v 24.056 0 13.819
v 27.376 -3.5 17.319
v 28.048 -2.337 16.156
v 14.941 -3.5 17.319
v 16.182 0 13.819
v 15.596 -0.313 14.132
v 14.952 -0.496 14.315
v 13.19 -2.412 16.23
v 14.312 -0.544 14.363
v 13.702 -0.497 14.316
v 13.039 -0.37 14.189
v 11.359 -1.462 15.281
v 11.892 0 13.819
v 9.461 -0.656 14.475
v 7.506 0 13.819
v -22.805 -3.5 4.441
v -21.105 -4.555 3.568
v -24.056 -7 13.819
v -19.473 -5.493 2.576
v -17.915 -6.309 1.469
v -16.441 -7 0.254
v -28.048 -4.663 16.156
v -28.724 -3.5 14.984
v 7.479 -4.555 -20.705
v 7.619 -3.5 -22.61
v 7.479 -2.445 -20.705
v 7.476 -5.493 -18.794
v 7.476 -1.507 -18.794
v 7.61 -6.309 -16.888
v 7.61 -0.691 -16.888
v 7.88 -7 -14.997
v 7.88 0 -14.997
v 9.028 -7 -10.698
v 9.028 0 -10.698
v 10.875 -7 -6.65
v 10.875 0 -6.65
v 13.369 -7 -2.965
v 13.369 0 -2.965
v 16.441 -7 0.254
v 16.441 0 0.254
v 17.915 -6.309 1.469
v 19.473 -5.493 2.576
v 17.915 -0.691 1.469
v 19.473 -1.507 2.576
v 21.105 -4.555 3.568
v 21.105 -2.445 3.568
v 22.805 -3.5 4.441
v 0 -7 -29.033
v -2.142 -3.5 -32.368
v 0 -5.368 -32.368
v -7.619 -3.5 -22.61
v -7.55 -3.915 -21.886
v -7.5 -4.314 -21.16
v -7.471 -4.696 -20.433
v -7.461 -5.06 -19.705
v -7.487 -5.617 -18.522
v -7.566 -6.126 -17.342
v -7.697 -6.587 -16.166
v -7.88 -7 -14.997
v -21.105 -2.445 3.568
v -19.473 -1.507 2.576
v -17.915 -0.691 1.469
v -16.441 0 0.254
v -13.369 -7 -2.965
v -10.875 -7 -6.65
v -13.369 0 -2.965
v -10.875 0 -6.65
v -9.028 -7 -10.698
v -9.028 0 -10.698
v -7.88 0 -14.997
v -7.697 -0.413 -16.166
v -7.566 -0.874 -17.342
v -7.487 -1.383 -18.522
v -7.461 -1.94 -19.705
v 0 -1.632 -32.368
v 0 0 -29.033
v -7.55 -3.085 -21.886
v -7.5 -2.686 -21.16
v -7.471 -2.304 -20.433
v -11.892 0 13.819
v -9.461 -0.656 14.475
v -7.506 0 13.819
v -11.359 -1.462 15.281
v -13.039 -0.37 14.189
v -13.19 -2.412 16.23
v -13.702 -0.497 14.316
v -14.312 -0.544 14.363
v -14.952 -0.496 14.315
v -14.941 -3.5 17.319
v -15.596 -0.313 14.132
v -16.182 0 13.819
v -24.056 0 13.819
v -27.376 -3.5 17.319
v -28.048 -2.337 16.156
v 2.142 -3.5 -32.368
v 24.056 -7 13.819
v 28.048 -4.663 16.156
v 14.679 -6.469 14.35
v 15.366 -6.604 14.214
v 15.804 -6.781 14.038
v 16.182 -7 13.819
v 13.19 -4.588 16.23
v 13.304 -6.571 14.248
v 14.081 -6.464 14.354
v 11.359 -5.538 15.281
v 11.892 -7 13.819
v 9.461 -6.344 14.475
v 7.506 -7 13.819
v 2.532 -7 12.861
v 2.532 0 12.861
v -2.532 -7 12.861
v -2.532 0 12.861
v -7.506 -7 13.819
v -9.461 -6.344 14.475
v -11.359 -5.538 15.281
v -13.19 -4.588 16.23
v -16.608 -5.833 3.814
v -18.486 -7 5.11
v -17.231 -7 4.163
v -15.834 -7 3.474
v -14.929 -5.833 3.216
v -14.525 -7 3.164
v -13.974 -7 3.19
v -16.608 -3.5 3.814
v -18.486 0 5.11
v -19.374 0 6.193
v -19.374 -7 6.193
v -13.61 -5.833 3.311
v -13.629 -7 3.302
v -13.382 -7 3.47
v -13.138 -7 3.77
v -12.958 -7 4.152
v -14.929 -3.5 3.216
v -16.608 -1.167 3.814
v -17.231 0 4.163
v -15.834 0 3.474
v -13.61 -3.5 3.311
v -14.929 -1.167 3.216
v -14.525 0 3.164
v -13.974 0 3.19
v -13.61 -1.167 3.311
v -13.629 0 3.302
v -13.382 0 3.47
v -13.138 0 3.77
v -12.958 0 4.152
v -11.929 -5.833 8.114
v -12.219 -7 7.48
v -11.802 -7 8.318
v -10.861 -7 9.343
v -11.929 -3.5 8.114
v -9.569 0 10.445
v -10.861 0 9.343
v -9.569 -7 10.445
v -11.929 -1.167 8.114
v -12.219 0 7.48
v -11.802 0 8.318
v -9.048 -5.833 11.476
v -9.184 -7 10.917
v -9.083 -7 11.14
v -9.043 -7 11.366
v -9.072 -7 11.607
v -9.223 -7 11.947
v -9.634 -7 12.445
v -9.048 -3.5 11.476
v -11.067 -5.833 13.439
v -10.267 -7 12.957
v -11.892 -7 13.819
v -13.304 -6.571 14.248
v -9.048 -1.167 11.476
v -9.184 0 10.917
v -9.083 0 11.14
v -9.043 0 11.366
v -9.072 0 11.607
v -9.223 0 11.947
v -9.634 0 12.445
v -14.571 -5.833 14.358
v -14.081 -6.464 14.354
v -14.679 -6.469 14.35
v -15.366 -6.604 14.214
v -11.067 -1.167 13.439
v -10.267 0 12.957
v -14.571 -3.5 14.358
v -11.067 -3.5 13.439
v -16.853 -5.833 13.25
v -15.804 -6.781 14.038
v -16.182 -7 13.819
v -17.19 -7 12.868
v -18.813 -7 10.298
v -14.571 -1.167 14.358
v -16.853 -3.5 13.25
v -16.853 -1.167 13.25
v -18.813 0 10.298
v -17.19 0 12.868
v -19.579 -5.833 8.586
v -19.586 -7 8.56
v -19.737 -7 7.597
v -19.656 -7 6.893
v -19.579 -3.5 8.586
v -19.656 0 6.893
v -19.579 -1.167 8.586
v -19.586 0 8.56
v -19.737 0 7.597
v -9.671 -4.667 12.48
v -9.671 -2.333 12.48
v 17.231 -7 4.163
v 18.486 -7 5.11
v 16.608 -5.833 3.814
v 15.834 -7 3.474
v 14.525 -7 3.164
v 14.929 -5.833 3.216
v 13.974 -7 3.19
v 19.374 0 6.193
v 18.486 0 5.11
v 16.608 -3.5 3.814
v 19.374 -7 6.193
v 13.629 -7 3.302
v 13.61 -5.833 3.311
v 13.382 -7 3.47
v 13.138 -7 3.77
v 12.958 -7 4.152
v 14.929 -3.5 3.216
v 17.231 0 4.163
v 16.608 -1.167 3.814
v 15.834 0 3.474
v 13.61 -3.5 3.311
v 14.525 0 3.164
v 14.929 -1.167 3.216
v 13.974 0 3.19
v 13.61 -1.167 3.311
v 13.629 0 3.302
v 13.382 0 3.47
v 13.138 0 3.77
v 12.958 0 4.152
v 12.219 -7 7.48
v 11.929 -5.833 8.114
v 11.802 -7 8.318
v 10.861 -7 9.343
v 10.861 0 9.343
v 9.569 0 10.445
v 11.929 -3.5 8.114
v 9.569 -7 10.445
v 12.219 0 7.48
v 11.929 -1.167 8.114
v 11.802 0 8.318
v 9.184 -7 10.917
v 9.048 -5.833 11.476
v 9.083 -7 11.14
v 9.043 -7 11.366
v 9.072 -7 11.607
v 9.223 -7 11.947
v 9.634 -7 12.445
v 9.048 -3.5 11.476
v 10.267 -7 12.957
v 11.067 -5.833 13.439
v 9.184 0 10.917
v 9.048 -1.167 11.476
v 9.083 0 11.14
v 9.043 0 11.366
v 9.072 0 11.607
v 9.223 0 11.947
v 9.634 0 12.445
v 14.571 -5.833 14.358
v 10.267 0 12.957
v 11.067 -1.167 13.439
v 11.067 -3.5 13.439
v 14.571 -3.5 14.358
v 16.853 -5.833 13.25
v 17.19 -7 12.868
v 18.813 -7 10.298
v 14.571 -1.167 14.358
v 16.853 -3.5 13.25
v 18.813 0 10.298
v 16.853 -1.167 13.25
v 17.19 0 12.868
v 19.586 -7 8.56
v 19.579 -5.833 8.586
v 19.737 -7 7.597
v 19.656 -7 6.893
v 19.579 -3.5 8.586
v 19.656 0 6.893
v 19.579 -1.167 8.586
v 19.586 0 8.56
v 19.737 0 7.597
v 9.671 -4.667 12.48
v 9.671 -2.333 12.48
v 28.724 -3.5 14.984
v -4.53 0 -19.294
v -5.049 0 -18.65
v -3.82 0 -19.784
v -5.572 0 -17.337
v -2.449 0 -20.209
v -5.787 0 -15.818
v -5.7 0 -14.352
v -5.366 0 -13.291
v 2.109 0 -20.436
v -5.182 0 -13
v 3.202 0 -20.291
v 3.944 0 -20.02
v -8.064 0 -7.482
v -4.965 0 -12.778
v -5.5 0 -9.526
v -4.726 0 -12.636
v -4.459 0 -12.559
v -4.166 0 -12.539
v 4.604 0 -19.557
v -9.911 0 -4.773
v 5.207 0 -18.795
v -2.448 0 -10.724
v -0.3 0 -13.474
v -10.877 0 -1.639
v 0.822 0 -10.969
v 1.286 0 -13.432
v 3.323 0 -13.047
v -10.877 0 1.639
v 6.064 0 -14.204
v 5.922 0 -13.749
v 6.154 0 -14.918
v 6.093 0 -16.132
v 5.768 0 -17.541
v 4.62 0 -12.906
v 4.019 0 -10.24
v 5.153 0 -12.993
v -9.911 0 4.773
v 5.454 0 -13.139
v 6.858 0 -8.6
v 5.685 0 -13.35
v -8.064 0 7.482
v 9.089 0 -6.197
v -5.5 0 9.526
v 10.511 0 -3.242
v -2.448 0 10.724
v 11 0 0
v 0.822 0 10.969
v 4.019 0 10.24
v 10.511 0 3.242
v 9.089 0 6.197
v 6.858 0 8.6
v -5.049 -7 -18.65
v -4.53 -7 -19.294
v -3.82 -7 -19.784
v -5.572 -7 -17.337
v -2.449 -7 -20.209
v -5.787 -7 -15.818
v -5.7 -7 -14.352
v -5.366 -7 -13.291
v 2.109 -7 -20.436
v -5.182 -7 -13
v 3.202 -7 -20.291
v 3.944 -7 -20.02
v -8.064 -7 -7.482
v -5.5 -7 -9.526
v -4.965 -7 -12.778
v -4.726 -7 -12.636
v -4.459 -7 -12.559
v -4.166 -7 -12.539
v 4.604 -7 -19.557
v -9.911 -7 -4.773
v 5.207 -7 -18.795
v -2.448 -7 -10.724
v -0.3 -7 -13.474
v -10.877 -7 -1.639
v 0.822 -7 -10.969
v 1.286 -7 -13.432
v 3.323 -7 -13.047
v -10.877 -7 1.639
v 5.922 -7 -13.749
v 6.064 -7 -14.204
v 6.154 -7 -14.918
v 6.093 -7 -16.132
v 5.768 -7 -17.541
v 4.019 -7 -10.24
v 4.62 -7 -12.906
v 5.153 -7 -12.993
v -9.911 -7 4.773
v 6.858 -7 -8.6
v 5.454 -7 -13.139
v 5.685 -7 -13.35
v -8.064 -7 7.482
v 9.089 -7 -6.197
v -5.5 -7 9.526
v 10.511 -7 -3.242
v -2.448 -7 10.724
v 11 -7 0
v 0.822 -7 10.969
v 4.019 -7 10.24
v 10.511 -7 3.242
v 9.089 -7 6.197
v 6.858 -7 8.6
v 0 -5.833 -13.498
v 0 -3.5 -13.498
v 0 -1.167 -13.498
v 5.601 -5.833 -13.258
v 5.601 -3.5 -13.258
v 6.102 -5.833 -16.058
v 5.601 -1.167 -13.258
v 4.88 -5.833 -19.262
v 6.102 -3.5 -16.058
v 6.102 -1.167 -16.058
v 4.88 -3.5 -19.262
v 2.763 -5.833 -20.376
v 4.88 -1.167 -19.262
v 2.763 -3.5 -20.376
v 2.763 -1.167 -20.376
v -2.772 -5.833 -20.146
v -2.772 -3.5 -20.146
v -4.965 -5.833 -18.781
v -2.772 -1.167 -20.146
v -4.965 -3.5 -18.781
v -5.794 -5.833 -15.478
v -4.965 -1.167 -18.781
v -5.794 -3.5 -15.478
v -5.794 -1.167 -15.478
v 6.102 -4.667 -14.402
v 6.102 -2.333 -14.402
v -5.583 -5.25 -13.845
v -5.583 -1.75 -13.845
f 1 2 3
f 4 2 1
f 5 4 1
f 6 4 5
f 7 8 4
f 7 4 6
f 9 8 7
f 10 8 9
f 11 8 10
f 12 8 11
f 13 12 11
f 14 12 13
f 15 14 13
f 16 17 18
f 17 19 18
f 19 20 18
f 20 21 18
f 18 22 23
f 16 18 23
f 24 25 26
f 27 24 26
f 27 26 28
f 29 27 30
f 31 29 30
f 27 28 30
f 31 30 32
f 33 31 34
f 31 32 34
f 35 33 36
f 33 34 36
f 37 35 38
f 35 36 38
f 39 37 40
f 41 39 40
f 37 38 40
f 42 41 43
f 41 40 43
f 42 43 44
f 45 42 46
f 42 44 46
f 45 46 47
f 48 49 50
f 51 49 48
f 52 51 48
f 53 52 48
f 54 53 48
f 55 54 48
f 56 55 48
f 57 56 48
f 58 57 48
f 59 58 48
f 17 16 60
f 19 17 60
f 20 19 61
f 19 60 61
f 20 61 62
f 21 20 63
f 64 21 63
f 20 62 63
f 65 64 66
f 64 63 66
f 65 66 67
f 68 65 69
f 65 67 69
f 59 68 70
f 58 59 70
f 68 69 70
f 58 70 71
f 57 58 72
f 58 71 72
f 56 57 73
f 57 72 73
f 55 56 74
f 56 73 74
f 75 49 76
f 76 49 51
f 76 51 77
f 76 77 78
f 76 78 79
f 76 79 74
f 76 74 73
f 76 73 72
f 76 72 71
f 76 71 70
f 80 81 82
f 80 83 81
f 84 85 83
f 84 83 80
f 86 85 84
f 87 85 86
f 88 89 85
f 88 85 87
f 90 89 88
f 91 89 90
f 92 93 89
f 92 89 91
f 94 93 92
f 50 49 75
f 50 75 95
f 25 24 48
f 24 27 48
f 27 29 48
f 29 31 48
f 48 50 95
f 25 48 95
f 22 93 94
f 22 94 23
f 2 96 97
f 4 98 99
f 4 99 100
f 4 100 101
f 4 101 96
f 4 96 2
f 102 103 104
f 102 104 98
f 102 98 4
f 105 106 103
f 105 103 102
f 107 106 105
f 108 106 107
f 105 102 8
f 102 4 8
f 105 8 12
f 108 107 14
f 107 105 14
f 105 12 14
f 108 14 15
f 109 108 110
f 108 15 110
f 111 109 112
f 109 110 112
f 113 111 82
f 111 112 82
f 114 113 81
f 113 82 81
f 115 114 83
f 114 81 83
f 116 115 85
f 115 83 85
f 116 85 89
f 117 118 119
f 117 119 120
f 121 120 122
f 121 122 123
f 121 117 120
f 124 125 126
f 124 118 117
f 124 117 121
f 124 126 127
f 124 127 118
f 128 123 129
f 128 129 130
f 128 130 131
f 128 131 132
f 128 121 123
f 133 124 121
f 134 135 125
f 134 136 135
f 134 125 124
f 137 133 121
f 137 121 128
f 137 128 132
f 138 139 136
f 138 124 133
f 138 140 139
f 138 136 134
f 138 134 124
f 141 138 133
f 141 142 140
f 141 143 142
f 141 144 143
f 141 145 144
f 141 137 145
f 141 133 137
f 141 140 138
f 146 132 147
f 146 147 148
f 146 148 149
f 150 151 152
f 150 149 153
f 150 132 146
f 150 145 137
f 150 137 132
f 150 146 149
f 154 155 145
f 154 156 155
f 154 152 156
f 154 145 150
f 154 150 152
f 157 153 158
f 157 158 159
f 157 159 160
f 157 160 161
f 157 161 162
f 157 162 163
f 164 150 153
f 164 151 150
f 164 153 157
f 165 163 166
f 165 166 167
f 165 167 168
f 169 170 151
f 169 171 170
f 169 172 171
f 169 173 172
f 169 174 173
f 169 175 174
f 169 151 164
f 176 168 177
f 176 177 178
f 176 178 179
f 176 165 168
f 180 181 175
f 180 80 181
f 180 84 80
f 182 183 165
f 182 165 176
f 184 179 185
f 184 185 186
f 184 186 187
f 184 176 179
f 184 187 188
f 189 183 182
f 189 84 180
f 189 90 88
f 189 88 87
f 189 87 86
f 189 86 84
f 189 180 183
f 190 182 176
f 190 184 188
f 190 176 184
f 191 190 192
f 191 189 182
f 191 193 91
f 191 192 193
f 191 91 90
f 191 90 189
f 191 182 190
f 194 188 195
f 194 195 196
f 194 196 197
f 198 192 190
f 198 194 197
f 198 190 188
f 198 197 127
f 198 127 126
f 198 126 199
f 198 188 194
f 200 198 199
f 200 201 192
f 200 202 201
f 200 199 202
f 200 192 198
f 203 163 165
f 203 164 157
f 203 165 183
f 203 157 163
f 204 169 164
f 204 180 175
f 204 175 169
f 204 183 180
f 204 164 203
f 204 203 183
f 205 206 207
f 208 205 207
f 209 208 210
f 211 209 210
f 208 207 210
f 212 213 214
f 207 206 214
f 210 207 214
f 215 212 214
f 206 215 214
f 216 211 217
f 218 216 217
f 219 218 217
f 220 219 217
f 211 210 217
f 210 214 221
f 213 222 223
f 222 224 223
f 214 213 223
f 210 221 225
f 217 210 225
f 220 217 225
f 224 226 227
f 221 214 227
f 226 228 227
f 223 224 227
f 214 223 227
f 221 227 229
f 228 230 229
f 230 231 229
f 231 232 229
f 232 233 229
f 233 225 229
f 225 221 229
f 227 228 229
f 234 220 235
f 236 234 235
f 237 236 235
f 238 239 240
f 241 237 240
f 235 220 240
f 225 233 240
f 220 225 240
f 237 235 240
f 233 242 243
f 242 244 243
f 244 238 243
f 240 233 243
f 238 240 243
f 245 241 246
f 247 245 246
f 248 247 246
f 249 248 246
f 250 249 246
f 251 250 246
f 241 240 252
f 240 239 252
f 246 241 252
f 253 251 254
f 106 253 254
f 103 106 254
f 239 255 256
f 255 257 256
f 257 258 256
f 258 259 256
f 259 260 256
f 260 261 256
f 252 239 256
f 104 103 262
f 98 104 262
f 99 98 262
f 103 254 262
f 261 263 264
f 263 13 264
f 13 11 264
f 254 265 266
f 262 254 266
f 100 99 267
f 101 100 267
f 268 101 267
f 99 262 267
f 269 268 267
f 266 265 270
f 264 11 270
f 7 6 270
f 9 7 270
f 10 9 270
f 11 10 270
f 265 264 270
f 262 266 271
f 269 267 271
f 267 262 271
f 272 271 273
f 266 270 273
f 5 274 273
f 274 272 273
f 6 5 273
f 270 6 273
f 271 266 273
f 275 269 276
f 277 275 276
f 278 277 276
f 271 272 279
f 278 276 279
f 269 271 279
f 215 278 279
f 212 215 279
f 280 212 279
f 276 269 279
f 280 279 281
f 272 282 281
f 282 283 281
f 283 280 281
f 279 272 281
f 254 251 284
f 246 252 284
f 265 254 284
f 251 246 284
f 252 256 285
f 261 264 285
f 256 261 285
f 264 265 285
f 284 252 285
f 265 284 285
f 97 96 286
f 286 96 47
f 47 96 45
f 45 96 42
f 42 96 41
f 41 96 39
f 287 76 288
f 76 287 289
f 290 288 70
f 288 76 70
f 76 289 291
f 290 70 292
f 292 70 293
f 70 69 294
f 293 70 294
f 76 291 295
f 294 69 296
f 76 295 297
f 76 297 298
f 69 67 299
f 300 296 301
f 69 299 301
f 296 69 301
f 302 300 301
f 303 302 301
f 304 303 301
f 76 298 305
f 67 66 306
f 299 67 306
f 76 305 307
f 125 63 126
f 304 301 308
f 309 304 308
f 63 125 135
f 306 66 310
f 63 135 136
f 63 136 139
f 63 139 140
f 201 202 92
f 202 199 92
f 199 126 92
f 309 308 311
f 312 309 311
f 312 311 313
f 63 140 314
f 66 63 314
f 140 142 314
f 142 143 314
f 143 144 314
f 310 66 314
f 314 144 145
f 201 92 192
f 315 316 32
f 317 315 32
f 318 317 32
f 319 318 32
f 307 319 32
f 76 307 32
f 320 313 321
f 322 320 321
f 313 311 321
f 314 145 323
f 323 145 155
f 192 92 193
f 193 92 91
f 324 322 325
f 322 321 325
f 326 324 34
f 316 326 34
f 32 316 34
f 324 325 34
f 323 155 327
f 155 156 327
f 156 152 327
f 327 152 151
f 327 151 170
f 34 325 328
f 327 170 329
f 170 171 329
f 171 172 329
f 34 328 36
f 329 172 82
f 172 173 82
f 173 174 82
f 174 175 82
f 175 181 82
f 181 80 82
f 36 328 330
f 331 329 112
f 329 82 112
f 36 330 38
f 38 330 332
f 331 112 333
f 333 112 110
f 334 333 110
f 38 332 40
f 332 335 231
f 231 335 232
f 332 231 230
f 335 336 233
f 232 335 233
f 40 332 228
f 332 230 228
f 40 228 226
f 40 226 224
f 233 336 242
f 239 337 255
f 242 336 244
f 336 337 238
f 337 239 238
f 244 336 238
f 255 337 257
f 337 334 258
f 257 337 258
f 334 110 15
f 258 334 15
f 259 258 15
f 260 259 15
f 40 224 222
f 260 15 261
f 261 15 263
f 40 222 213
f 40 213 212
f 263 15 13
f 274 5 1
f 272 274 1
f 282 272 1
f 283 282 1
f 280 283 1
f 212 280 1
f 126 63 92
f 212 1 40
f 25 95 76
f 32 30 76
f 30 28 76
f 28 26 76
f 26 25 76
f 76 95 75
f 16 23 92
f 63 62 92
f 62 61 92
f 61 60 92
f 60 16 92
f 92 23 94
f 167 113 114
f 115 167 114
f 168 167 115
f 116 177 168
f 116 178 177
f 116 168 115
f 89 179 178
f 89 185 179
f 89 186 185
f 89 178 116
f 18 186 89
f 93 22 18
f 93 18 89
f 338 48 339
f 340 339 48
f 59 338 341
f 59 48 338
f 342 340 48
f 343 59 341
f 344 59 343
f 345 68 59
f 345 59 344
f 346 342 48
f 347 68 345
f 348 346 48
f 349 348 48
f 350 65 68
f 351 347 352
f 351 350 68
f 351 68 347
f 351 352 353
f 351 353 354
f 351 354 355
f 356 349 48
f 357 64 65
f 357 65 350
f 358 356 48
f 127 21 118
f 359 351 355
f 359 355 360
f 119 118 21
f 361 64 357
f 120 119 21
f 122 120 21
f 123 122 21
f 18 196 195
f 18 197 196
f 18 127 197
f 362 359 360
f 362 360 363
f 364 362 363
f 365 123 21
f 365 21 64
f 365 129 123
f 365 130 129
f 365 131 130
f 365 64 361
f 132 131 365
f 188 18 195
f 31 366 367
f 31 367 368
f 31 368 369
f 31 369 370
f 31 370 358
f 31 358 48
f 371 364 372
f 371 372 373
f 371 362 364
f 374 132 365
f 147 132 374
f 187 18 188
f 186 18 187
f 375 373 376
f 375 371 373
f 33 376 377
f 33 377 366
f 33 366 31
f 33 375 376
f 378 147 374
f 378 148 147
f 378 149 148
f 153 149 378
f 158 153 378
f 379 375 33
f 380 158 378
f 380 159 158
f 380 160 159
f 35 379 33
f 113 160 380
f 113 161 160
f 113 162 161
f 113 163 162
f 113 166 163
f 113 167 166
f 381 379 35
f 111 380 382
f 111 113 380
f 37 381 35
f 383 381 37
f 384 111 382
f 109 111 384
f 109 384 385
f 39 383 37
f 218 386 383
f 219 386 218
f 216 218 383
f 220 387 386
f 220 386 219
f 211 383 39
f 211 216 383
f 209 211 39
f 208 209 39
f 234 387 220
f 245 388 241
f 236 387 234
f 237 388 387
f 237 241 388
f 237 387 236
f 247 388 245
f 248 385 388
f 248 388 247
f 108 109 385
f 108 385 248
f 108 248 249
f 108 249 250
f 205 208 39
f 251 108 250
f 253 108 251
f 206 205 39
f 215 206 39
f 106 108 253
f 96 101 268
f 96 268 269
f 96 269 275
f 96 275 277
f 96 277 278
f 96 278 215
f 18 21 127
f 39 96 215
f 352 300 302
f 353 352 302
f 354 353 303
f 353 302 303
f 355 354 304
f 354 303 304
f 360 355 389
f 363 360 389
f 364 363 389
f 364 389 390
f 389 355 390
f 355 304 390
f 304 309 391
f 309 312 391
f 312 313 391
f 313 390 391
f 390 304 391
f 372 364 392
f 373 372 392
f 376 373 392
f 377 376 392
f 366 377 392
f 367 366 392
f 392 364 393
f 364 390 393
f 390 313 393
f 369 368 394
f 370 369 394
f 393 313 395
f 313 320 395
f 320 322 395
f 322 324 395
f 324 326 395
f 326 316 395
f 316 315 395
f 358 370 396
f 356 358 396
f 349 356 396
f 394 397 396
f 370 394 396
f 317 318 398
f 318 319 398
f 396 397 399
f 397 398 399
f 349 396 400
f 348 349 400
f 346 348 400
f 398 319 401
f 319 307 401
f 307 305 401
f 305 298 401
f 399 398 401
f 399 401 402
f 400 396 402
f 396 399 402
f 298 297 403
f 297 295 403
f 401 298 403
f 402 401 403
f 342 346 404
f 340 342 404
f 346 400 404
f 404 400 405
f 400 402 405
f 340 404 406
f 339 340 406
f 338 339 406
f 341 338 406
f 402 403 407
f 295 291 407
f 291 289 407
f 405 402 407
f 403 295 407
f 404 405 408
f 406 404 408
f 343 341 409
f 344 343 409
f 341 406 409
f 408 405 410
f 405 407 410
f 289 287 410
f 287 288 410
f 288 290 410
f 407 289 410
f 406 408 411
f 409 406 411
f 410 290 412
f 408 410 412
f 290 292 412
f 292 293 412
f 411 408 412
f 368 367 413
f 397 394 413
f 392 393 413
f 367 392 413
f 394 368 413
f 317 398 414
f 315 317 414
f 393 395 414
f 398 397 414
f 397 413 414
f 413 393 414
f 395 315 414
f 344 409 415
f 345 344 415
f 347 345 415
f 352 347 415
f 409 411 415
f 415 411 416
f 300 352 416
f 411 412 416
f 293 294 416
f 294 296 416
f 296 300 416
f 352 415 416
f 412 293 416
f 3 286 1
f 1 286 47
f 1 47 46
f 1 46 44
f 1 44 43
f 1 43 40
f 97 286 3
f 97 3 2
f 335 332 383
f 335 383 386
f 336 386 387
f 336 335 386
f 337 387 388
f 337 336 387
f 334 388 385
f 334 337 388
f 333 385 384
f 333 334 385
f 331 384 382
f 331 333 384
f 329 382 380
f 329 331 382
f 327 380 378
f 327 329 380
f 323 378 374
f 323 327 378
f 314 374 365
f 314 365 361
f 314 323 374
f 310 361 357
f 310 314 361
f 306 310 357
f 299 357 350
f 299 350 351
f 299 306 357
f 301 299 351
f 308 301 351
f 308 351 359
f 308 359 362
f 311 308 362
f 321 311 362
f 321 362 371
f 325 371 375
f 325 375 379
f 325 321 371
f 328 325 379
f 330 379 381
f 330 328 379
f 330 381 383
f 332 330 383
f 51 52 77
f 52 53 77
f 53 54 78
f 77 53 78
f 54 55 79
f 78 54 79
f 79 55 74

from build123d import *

# Parameters (mm, degrees)
F0_R         = 11
F1_DEPTH     = 7
F2_T1_DEPTH  = 35.2813832436
F2_T3_DEPTH  = 35.5467430765
F2_T5_DEPTH  = 34.4305362998
F2_T7_DEPTH  = 34.4305362998
F2_T9_DEPTH  = 35.2813832436
F2_T11_DEPTH = 35.5467430765


# Not quite as in the source:
# - a fillet or chamfer that OpenCascade refuses, or shapes differently, is made with other operations: its cross-section is extruded or revolved along the edge and cut away or added


with BuildPart() as f1:
    # F0 (on Front) → F1 (new body)
    with BuildSketch(Plane.XZ):
        with BuildLine():
            Line((-8.017778225, -25.1282889185), (-3.9536927291, -32.3677882552))
            Line((-3.9536927291, -32.3677882552), (3.9536927291, -32.3677882552))
            Line((3.9536927291, -32.3677882552), (8.017778225, -25.1282889185))
            ThreePointArc((8.017778225, -25.1282889185), (10.8745416094, -6.6499044579), (25.1621004057, 5.4114989824))
            Line((25.1621004057, 5.4114989824), (29.6426898708, 13.3929315811))
            Line((29.6426898708, 13.3929315811), (26.4639375252, 18.8986921484))
            Line((26.4639375252, 18.8986921484), (17.0454936065, 18.8986921484))
            ThreePointArc((17.0454936065, 18.8986921484), (0, 12.7406410493), (-17.0454936065, 18.8986921484))
            Line((-17.0454936065, 18.8986921484), (-26.4639375252, 18.8986921484))
            Line((-26.4639375252, 18.8986921484), (-29.6426898708, 13.3929315811))
            Line((-29.6426898708, 13.3929315811), (-25.1621004057, 5.4114989824))
            ThreePointArc((-25.1621004057, 5.4114989824), (-12.3306252771, -4.3414248541), (-7.4606163281, -19.7053205246))
            ThreePointArc((-7.4606163281, -19.7053205246), (-7.6002724535, -22.4310780148), (-8.017778225, -25.1282889185))
        make_face()
        Circle(F0_R, mode=Mode.SUBTRACT)
        with BuildLine():
            add(Edge.make_bspline(
                [(-19.3735472858, 6.192852743), (-18.3495240804, 4.3809635142), (-11.9151294961, 1.0595732713), (-13.3041344414, 8.8422203653), (-6.4288769454, 11.2946801857), (-15.4136761166, 16.0382229659), (-18.410160006, 11.0468887375), (-20.2663386903, 7.7725426571), (-19.3735472858, 6.192852743)],
                knots=[0, 0, 0, 0, 0.1830546722, 0.3457253498, 0.4974713646, 0.6774626151, 0.8404043609, 1, 1, 1, 1], degree=3))
        make_face(mode=Mode.SUBTRACT)
        with BuildLine():
            add(Edge.make_bspline(
                [(-4.9653253518, -12.7779729664), (-3.9673538813, -11.990438984), (-0.0815721197, -14.8647438543), (7.1063785889, -10.9230753891), (5.7028649477, -20.847724526), (0.130602412, -20.2827447937), (-6.1063753916, -20.3844092682), (-6.0569718905, -13.6394292017), (-4.9653253518, -12.7779729664)],
                knots=[0, 0, 0, 0, 0.1595531099, 0.3282047144, 0.5033592864, 0.6613074183, 0.8254703614, 1, 1, 1, 1], degree=3))
        make_face(mode=Mode.SUBTRACT)
        with BuildLine():
            add(Edge.make_bspline(
                [(19.3735472858, 6.192852743), (18.3495240804, 4.3809635142), (11.9151294961, 1.0595732713), (13.3041344414, 8.8422203653), (6.4288769454, 11.2946801857), (15.4136761166, 16.0382229659), (18.410160006, 11.0468887375), (20.2663386903, 7.7725426571), (19.3735472858, 6.192852743)],
                knots=[0, 0, 0, 0, 0.1830546722, 0.3457253498, 0.4974713646, 0.6774626151, 0.8404043609, 1, 1, 1, 1], degree=3))
        make_face(mode=Mode.SUBTRACT)
    extrude(amount=F1_DEPTH)

    # F2: chamfer of 5.08 on 12 edges, made by hand

    # F2_s2 → F2_t1 (cut)
    with BuildSketch(Plane(origin=(-19.2151547034, 0, 34.2286351679), x_dir=(0, 1, 0), z_dir=(0.4895169129, 0, -0.8719938027))):
        Polygon((-7, -14.2121753414), (-1.92, -19.2921753414), (-7, -19.2921753414), align=None)
        Polygon((-5.08, -19.2921753414), (0, -14.2121753414), (0, -19.2921753414), align=None)
    extrude(amount=F2_T1_DEPTH, mode=Mode.SUBTRACT)

    # F2_s4 → F2_t3 (cut)
    with BuildSketch(Plane.YZ.offset(-39.5280871041)):
        Polygon((-7, 13.8186921484), (-1.92, 18.8986921484), (-7, 18.8986921484), align=None)
        Polygon((-5.08, 18.8986921484), (0, 13.8186921484), (0, 18.8986921484), align=None)
    extrude(amount=F2_T3_DEPTH, mode=Mode.SUBTRACT)

    # F2_s6 → F2_t5 (cut)
    with BuildSketch(Plane(origin=(-19.2640867811, 0, -34.3157996098), x_dir=(0, 1, 0), z_dir=(0.4895169129, 0, 0.8719938027))):
        Polygon((-7, -14.2121753414), (-1.92, -19.2921753414), (-7, -19.2921753414), align=None)
        Polygon((-5.08, -19.2921753414), (0, -14.2121753414), (0, -19.2921753414), align=None)
    extrude(amount=F2_T5_DEPTH, mode=Mode.SUBTRACT)

    # F2_s8 → F2_t7 (cut)
    with BuildSketch(Plane(origin=(2.4097569425, 0, -4.2925853318), x_dir=(0, 1, 0), z_dir=(0.4895169129, 0, -0.8719938027))):
        Polygon((-1.92, -19.2921753414), (-7, -14.2121753414), (-7, -19.2921753414), align=None)
        Polygon((-5.08, -19.2921753414), (0, -14.2121753414), (0, -19.2921753414), align=None)
    extrude(amount=F2_T7_DEPTH, mode=Mode.SUBTRACT)

    # F2_s10 → F2_t9 (cut)
    with BuildSketch(Plane(origin=(1.9443208955, 0, 3.4634876278), x_dir=(0, 1, 0), z_dir=(0.4895169129, 0, 0.8719938027))):
        Polygon((-7, -14.2121753414), (-1.92, -19.2921753414), (-7, -19.2921753414), align=None)
        Polygon((-5.08, -19.2921753414), (0, -14.2121753414), (0, -19.2921753414), align=None)
    extrude(amount=F2_T9_DEPTH, mode=Mode.SUBTRACT)

    # F2_s12 → F2_t11 (cut)
    with BuildSketch(Plane.YZ.offset(3.9813440276)):
        Polygon((-7, 13.8186921484), (-1.92, 18.8986921484), (-7, 18.8986921484), align=None)
        Polygon((-5.08, 18.8986921484), (0, 13.8186921484), (0, 18.8986921484), align=None)
    extrude(amount=F2_T11_DEPTH, mode=Mode.SUBTRACT)


solid = f1.part
